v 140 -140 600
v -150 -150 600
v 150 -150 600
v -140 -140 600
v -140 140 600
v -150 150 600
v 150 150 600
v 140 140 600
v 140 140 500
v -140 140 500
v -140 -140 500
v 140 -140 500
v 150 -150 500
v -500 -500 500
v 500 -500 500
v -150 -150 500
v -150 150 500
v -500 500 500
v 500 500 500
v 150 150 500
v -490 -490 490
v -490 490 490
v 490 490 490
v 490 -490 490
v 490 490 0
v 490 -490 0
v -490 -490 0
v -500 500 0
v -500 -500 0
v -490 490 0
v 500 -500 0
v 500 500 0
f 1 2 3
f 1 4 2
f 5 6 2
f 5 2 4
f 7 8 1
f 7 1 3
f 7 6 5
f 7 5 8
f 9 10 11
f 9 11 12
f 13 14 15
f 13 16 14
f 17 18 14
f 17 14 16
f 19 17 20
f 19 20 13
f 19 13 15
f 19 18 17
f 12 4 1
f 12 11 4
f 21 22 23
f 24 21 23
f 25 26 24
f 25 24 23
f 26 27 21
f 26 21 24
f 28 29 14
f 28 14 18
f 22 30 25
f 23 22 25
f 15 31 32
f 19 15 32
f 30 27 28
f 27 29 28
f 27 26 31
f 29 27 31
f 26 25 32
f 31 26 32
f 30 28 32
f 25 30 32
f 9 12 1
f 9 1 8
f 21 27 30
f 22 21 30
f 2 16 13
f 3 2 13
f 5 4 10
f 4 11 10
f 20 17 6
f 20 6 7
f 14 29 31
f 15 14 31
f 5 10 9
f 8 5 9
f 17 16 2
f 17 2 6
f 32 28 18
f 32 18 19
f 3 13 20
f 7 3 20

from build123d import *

# Parameters (mm, degrees)
F0_W     = 1000
F0_H     = 1000
F1_DEPTH = 500
F3_T     = -10
F2_W     = 300
F2_H     = 300
F4_DEPTH = 100
F5_T     = -10


# Not quite as in the source:
# - a shell that OpenCascade refuses in one call is made with other operations: the cavity is built on its own and cut out


with BuildPart() as f1:
    # F0 (on Top) → F1 (new body)
    with BuildSketch(Plane.XY):
        Rectangle(F0_W, F0_H)
    extrude(amount=F1_DEPTH)

    # F3
    f3_openings = [f1.faces().sort_by_distance(p)[0] for p in [
        (0, 0, 0),
    ]]
    offset(amount=F3_T, openings=f3_openings)

    # F2 (on face) → F4 (join)
    with BuildSketch(Plane.XY.offset(500)):
        Rectangle(F2_W, F2_H)
    extrude(amount=F4_DEPTH)

    # F5: a shell. OpenCascade refuses it in one call, so the cavity is built on its own and cut out:
    # the body offset inwards by the wall thickness, plus a prism from it out through each open face.
    f5_core = offset(f1.part, amount=F5_T, kind=Kind.INTERSECTION, mode=Mode.PRIVATE)
    f5_exits = [f5_core.faces().sort_by_distance(p)[0] for p in [
        (0, 0, 590),
    ]]
    add(f5_core, mode=Mode.SUBTRACT)
    extrude(f5_exits, amount=-F5_T, mode=Mode.SUBTRACT)


solid = f1.part
